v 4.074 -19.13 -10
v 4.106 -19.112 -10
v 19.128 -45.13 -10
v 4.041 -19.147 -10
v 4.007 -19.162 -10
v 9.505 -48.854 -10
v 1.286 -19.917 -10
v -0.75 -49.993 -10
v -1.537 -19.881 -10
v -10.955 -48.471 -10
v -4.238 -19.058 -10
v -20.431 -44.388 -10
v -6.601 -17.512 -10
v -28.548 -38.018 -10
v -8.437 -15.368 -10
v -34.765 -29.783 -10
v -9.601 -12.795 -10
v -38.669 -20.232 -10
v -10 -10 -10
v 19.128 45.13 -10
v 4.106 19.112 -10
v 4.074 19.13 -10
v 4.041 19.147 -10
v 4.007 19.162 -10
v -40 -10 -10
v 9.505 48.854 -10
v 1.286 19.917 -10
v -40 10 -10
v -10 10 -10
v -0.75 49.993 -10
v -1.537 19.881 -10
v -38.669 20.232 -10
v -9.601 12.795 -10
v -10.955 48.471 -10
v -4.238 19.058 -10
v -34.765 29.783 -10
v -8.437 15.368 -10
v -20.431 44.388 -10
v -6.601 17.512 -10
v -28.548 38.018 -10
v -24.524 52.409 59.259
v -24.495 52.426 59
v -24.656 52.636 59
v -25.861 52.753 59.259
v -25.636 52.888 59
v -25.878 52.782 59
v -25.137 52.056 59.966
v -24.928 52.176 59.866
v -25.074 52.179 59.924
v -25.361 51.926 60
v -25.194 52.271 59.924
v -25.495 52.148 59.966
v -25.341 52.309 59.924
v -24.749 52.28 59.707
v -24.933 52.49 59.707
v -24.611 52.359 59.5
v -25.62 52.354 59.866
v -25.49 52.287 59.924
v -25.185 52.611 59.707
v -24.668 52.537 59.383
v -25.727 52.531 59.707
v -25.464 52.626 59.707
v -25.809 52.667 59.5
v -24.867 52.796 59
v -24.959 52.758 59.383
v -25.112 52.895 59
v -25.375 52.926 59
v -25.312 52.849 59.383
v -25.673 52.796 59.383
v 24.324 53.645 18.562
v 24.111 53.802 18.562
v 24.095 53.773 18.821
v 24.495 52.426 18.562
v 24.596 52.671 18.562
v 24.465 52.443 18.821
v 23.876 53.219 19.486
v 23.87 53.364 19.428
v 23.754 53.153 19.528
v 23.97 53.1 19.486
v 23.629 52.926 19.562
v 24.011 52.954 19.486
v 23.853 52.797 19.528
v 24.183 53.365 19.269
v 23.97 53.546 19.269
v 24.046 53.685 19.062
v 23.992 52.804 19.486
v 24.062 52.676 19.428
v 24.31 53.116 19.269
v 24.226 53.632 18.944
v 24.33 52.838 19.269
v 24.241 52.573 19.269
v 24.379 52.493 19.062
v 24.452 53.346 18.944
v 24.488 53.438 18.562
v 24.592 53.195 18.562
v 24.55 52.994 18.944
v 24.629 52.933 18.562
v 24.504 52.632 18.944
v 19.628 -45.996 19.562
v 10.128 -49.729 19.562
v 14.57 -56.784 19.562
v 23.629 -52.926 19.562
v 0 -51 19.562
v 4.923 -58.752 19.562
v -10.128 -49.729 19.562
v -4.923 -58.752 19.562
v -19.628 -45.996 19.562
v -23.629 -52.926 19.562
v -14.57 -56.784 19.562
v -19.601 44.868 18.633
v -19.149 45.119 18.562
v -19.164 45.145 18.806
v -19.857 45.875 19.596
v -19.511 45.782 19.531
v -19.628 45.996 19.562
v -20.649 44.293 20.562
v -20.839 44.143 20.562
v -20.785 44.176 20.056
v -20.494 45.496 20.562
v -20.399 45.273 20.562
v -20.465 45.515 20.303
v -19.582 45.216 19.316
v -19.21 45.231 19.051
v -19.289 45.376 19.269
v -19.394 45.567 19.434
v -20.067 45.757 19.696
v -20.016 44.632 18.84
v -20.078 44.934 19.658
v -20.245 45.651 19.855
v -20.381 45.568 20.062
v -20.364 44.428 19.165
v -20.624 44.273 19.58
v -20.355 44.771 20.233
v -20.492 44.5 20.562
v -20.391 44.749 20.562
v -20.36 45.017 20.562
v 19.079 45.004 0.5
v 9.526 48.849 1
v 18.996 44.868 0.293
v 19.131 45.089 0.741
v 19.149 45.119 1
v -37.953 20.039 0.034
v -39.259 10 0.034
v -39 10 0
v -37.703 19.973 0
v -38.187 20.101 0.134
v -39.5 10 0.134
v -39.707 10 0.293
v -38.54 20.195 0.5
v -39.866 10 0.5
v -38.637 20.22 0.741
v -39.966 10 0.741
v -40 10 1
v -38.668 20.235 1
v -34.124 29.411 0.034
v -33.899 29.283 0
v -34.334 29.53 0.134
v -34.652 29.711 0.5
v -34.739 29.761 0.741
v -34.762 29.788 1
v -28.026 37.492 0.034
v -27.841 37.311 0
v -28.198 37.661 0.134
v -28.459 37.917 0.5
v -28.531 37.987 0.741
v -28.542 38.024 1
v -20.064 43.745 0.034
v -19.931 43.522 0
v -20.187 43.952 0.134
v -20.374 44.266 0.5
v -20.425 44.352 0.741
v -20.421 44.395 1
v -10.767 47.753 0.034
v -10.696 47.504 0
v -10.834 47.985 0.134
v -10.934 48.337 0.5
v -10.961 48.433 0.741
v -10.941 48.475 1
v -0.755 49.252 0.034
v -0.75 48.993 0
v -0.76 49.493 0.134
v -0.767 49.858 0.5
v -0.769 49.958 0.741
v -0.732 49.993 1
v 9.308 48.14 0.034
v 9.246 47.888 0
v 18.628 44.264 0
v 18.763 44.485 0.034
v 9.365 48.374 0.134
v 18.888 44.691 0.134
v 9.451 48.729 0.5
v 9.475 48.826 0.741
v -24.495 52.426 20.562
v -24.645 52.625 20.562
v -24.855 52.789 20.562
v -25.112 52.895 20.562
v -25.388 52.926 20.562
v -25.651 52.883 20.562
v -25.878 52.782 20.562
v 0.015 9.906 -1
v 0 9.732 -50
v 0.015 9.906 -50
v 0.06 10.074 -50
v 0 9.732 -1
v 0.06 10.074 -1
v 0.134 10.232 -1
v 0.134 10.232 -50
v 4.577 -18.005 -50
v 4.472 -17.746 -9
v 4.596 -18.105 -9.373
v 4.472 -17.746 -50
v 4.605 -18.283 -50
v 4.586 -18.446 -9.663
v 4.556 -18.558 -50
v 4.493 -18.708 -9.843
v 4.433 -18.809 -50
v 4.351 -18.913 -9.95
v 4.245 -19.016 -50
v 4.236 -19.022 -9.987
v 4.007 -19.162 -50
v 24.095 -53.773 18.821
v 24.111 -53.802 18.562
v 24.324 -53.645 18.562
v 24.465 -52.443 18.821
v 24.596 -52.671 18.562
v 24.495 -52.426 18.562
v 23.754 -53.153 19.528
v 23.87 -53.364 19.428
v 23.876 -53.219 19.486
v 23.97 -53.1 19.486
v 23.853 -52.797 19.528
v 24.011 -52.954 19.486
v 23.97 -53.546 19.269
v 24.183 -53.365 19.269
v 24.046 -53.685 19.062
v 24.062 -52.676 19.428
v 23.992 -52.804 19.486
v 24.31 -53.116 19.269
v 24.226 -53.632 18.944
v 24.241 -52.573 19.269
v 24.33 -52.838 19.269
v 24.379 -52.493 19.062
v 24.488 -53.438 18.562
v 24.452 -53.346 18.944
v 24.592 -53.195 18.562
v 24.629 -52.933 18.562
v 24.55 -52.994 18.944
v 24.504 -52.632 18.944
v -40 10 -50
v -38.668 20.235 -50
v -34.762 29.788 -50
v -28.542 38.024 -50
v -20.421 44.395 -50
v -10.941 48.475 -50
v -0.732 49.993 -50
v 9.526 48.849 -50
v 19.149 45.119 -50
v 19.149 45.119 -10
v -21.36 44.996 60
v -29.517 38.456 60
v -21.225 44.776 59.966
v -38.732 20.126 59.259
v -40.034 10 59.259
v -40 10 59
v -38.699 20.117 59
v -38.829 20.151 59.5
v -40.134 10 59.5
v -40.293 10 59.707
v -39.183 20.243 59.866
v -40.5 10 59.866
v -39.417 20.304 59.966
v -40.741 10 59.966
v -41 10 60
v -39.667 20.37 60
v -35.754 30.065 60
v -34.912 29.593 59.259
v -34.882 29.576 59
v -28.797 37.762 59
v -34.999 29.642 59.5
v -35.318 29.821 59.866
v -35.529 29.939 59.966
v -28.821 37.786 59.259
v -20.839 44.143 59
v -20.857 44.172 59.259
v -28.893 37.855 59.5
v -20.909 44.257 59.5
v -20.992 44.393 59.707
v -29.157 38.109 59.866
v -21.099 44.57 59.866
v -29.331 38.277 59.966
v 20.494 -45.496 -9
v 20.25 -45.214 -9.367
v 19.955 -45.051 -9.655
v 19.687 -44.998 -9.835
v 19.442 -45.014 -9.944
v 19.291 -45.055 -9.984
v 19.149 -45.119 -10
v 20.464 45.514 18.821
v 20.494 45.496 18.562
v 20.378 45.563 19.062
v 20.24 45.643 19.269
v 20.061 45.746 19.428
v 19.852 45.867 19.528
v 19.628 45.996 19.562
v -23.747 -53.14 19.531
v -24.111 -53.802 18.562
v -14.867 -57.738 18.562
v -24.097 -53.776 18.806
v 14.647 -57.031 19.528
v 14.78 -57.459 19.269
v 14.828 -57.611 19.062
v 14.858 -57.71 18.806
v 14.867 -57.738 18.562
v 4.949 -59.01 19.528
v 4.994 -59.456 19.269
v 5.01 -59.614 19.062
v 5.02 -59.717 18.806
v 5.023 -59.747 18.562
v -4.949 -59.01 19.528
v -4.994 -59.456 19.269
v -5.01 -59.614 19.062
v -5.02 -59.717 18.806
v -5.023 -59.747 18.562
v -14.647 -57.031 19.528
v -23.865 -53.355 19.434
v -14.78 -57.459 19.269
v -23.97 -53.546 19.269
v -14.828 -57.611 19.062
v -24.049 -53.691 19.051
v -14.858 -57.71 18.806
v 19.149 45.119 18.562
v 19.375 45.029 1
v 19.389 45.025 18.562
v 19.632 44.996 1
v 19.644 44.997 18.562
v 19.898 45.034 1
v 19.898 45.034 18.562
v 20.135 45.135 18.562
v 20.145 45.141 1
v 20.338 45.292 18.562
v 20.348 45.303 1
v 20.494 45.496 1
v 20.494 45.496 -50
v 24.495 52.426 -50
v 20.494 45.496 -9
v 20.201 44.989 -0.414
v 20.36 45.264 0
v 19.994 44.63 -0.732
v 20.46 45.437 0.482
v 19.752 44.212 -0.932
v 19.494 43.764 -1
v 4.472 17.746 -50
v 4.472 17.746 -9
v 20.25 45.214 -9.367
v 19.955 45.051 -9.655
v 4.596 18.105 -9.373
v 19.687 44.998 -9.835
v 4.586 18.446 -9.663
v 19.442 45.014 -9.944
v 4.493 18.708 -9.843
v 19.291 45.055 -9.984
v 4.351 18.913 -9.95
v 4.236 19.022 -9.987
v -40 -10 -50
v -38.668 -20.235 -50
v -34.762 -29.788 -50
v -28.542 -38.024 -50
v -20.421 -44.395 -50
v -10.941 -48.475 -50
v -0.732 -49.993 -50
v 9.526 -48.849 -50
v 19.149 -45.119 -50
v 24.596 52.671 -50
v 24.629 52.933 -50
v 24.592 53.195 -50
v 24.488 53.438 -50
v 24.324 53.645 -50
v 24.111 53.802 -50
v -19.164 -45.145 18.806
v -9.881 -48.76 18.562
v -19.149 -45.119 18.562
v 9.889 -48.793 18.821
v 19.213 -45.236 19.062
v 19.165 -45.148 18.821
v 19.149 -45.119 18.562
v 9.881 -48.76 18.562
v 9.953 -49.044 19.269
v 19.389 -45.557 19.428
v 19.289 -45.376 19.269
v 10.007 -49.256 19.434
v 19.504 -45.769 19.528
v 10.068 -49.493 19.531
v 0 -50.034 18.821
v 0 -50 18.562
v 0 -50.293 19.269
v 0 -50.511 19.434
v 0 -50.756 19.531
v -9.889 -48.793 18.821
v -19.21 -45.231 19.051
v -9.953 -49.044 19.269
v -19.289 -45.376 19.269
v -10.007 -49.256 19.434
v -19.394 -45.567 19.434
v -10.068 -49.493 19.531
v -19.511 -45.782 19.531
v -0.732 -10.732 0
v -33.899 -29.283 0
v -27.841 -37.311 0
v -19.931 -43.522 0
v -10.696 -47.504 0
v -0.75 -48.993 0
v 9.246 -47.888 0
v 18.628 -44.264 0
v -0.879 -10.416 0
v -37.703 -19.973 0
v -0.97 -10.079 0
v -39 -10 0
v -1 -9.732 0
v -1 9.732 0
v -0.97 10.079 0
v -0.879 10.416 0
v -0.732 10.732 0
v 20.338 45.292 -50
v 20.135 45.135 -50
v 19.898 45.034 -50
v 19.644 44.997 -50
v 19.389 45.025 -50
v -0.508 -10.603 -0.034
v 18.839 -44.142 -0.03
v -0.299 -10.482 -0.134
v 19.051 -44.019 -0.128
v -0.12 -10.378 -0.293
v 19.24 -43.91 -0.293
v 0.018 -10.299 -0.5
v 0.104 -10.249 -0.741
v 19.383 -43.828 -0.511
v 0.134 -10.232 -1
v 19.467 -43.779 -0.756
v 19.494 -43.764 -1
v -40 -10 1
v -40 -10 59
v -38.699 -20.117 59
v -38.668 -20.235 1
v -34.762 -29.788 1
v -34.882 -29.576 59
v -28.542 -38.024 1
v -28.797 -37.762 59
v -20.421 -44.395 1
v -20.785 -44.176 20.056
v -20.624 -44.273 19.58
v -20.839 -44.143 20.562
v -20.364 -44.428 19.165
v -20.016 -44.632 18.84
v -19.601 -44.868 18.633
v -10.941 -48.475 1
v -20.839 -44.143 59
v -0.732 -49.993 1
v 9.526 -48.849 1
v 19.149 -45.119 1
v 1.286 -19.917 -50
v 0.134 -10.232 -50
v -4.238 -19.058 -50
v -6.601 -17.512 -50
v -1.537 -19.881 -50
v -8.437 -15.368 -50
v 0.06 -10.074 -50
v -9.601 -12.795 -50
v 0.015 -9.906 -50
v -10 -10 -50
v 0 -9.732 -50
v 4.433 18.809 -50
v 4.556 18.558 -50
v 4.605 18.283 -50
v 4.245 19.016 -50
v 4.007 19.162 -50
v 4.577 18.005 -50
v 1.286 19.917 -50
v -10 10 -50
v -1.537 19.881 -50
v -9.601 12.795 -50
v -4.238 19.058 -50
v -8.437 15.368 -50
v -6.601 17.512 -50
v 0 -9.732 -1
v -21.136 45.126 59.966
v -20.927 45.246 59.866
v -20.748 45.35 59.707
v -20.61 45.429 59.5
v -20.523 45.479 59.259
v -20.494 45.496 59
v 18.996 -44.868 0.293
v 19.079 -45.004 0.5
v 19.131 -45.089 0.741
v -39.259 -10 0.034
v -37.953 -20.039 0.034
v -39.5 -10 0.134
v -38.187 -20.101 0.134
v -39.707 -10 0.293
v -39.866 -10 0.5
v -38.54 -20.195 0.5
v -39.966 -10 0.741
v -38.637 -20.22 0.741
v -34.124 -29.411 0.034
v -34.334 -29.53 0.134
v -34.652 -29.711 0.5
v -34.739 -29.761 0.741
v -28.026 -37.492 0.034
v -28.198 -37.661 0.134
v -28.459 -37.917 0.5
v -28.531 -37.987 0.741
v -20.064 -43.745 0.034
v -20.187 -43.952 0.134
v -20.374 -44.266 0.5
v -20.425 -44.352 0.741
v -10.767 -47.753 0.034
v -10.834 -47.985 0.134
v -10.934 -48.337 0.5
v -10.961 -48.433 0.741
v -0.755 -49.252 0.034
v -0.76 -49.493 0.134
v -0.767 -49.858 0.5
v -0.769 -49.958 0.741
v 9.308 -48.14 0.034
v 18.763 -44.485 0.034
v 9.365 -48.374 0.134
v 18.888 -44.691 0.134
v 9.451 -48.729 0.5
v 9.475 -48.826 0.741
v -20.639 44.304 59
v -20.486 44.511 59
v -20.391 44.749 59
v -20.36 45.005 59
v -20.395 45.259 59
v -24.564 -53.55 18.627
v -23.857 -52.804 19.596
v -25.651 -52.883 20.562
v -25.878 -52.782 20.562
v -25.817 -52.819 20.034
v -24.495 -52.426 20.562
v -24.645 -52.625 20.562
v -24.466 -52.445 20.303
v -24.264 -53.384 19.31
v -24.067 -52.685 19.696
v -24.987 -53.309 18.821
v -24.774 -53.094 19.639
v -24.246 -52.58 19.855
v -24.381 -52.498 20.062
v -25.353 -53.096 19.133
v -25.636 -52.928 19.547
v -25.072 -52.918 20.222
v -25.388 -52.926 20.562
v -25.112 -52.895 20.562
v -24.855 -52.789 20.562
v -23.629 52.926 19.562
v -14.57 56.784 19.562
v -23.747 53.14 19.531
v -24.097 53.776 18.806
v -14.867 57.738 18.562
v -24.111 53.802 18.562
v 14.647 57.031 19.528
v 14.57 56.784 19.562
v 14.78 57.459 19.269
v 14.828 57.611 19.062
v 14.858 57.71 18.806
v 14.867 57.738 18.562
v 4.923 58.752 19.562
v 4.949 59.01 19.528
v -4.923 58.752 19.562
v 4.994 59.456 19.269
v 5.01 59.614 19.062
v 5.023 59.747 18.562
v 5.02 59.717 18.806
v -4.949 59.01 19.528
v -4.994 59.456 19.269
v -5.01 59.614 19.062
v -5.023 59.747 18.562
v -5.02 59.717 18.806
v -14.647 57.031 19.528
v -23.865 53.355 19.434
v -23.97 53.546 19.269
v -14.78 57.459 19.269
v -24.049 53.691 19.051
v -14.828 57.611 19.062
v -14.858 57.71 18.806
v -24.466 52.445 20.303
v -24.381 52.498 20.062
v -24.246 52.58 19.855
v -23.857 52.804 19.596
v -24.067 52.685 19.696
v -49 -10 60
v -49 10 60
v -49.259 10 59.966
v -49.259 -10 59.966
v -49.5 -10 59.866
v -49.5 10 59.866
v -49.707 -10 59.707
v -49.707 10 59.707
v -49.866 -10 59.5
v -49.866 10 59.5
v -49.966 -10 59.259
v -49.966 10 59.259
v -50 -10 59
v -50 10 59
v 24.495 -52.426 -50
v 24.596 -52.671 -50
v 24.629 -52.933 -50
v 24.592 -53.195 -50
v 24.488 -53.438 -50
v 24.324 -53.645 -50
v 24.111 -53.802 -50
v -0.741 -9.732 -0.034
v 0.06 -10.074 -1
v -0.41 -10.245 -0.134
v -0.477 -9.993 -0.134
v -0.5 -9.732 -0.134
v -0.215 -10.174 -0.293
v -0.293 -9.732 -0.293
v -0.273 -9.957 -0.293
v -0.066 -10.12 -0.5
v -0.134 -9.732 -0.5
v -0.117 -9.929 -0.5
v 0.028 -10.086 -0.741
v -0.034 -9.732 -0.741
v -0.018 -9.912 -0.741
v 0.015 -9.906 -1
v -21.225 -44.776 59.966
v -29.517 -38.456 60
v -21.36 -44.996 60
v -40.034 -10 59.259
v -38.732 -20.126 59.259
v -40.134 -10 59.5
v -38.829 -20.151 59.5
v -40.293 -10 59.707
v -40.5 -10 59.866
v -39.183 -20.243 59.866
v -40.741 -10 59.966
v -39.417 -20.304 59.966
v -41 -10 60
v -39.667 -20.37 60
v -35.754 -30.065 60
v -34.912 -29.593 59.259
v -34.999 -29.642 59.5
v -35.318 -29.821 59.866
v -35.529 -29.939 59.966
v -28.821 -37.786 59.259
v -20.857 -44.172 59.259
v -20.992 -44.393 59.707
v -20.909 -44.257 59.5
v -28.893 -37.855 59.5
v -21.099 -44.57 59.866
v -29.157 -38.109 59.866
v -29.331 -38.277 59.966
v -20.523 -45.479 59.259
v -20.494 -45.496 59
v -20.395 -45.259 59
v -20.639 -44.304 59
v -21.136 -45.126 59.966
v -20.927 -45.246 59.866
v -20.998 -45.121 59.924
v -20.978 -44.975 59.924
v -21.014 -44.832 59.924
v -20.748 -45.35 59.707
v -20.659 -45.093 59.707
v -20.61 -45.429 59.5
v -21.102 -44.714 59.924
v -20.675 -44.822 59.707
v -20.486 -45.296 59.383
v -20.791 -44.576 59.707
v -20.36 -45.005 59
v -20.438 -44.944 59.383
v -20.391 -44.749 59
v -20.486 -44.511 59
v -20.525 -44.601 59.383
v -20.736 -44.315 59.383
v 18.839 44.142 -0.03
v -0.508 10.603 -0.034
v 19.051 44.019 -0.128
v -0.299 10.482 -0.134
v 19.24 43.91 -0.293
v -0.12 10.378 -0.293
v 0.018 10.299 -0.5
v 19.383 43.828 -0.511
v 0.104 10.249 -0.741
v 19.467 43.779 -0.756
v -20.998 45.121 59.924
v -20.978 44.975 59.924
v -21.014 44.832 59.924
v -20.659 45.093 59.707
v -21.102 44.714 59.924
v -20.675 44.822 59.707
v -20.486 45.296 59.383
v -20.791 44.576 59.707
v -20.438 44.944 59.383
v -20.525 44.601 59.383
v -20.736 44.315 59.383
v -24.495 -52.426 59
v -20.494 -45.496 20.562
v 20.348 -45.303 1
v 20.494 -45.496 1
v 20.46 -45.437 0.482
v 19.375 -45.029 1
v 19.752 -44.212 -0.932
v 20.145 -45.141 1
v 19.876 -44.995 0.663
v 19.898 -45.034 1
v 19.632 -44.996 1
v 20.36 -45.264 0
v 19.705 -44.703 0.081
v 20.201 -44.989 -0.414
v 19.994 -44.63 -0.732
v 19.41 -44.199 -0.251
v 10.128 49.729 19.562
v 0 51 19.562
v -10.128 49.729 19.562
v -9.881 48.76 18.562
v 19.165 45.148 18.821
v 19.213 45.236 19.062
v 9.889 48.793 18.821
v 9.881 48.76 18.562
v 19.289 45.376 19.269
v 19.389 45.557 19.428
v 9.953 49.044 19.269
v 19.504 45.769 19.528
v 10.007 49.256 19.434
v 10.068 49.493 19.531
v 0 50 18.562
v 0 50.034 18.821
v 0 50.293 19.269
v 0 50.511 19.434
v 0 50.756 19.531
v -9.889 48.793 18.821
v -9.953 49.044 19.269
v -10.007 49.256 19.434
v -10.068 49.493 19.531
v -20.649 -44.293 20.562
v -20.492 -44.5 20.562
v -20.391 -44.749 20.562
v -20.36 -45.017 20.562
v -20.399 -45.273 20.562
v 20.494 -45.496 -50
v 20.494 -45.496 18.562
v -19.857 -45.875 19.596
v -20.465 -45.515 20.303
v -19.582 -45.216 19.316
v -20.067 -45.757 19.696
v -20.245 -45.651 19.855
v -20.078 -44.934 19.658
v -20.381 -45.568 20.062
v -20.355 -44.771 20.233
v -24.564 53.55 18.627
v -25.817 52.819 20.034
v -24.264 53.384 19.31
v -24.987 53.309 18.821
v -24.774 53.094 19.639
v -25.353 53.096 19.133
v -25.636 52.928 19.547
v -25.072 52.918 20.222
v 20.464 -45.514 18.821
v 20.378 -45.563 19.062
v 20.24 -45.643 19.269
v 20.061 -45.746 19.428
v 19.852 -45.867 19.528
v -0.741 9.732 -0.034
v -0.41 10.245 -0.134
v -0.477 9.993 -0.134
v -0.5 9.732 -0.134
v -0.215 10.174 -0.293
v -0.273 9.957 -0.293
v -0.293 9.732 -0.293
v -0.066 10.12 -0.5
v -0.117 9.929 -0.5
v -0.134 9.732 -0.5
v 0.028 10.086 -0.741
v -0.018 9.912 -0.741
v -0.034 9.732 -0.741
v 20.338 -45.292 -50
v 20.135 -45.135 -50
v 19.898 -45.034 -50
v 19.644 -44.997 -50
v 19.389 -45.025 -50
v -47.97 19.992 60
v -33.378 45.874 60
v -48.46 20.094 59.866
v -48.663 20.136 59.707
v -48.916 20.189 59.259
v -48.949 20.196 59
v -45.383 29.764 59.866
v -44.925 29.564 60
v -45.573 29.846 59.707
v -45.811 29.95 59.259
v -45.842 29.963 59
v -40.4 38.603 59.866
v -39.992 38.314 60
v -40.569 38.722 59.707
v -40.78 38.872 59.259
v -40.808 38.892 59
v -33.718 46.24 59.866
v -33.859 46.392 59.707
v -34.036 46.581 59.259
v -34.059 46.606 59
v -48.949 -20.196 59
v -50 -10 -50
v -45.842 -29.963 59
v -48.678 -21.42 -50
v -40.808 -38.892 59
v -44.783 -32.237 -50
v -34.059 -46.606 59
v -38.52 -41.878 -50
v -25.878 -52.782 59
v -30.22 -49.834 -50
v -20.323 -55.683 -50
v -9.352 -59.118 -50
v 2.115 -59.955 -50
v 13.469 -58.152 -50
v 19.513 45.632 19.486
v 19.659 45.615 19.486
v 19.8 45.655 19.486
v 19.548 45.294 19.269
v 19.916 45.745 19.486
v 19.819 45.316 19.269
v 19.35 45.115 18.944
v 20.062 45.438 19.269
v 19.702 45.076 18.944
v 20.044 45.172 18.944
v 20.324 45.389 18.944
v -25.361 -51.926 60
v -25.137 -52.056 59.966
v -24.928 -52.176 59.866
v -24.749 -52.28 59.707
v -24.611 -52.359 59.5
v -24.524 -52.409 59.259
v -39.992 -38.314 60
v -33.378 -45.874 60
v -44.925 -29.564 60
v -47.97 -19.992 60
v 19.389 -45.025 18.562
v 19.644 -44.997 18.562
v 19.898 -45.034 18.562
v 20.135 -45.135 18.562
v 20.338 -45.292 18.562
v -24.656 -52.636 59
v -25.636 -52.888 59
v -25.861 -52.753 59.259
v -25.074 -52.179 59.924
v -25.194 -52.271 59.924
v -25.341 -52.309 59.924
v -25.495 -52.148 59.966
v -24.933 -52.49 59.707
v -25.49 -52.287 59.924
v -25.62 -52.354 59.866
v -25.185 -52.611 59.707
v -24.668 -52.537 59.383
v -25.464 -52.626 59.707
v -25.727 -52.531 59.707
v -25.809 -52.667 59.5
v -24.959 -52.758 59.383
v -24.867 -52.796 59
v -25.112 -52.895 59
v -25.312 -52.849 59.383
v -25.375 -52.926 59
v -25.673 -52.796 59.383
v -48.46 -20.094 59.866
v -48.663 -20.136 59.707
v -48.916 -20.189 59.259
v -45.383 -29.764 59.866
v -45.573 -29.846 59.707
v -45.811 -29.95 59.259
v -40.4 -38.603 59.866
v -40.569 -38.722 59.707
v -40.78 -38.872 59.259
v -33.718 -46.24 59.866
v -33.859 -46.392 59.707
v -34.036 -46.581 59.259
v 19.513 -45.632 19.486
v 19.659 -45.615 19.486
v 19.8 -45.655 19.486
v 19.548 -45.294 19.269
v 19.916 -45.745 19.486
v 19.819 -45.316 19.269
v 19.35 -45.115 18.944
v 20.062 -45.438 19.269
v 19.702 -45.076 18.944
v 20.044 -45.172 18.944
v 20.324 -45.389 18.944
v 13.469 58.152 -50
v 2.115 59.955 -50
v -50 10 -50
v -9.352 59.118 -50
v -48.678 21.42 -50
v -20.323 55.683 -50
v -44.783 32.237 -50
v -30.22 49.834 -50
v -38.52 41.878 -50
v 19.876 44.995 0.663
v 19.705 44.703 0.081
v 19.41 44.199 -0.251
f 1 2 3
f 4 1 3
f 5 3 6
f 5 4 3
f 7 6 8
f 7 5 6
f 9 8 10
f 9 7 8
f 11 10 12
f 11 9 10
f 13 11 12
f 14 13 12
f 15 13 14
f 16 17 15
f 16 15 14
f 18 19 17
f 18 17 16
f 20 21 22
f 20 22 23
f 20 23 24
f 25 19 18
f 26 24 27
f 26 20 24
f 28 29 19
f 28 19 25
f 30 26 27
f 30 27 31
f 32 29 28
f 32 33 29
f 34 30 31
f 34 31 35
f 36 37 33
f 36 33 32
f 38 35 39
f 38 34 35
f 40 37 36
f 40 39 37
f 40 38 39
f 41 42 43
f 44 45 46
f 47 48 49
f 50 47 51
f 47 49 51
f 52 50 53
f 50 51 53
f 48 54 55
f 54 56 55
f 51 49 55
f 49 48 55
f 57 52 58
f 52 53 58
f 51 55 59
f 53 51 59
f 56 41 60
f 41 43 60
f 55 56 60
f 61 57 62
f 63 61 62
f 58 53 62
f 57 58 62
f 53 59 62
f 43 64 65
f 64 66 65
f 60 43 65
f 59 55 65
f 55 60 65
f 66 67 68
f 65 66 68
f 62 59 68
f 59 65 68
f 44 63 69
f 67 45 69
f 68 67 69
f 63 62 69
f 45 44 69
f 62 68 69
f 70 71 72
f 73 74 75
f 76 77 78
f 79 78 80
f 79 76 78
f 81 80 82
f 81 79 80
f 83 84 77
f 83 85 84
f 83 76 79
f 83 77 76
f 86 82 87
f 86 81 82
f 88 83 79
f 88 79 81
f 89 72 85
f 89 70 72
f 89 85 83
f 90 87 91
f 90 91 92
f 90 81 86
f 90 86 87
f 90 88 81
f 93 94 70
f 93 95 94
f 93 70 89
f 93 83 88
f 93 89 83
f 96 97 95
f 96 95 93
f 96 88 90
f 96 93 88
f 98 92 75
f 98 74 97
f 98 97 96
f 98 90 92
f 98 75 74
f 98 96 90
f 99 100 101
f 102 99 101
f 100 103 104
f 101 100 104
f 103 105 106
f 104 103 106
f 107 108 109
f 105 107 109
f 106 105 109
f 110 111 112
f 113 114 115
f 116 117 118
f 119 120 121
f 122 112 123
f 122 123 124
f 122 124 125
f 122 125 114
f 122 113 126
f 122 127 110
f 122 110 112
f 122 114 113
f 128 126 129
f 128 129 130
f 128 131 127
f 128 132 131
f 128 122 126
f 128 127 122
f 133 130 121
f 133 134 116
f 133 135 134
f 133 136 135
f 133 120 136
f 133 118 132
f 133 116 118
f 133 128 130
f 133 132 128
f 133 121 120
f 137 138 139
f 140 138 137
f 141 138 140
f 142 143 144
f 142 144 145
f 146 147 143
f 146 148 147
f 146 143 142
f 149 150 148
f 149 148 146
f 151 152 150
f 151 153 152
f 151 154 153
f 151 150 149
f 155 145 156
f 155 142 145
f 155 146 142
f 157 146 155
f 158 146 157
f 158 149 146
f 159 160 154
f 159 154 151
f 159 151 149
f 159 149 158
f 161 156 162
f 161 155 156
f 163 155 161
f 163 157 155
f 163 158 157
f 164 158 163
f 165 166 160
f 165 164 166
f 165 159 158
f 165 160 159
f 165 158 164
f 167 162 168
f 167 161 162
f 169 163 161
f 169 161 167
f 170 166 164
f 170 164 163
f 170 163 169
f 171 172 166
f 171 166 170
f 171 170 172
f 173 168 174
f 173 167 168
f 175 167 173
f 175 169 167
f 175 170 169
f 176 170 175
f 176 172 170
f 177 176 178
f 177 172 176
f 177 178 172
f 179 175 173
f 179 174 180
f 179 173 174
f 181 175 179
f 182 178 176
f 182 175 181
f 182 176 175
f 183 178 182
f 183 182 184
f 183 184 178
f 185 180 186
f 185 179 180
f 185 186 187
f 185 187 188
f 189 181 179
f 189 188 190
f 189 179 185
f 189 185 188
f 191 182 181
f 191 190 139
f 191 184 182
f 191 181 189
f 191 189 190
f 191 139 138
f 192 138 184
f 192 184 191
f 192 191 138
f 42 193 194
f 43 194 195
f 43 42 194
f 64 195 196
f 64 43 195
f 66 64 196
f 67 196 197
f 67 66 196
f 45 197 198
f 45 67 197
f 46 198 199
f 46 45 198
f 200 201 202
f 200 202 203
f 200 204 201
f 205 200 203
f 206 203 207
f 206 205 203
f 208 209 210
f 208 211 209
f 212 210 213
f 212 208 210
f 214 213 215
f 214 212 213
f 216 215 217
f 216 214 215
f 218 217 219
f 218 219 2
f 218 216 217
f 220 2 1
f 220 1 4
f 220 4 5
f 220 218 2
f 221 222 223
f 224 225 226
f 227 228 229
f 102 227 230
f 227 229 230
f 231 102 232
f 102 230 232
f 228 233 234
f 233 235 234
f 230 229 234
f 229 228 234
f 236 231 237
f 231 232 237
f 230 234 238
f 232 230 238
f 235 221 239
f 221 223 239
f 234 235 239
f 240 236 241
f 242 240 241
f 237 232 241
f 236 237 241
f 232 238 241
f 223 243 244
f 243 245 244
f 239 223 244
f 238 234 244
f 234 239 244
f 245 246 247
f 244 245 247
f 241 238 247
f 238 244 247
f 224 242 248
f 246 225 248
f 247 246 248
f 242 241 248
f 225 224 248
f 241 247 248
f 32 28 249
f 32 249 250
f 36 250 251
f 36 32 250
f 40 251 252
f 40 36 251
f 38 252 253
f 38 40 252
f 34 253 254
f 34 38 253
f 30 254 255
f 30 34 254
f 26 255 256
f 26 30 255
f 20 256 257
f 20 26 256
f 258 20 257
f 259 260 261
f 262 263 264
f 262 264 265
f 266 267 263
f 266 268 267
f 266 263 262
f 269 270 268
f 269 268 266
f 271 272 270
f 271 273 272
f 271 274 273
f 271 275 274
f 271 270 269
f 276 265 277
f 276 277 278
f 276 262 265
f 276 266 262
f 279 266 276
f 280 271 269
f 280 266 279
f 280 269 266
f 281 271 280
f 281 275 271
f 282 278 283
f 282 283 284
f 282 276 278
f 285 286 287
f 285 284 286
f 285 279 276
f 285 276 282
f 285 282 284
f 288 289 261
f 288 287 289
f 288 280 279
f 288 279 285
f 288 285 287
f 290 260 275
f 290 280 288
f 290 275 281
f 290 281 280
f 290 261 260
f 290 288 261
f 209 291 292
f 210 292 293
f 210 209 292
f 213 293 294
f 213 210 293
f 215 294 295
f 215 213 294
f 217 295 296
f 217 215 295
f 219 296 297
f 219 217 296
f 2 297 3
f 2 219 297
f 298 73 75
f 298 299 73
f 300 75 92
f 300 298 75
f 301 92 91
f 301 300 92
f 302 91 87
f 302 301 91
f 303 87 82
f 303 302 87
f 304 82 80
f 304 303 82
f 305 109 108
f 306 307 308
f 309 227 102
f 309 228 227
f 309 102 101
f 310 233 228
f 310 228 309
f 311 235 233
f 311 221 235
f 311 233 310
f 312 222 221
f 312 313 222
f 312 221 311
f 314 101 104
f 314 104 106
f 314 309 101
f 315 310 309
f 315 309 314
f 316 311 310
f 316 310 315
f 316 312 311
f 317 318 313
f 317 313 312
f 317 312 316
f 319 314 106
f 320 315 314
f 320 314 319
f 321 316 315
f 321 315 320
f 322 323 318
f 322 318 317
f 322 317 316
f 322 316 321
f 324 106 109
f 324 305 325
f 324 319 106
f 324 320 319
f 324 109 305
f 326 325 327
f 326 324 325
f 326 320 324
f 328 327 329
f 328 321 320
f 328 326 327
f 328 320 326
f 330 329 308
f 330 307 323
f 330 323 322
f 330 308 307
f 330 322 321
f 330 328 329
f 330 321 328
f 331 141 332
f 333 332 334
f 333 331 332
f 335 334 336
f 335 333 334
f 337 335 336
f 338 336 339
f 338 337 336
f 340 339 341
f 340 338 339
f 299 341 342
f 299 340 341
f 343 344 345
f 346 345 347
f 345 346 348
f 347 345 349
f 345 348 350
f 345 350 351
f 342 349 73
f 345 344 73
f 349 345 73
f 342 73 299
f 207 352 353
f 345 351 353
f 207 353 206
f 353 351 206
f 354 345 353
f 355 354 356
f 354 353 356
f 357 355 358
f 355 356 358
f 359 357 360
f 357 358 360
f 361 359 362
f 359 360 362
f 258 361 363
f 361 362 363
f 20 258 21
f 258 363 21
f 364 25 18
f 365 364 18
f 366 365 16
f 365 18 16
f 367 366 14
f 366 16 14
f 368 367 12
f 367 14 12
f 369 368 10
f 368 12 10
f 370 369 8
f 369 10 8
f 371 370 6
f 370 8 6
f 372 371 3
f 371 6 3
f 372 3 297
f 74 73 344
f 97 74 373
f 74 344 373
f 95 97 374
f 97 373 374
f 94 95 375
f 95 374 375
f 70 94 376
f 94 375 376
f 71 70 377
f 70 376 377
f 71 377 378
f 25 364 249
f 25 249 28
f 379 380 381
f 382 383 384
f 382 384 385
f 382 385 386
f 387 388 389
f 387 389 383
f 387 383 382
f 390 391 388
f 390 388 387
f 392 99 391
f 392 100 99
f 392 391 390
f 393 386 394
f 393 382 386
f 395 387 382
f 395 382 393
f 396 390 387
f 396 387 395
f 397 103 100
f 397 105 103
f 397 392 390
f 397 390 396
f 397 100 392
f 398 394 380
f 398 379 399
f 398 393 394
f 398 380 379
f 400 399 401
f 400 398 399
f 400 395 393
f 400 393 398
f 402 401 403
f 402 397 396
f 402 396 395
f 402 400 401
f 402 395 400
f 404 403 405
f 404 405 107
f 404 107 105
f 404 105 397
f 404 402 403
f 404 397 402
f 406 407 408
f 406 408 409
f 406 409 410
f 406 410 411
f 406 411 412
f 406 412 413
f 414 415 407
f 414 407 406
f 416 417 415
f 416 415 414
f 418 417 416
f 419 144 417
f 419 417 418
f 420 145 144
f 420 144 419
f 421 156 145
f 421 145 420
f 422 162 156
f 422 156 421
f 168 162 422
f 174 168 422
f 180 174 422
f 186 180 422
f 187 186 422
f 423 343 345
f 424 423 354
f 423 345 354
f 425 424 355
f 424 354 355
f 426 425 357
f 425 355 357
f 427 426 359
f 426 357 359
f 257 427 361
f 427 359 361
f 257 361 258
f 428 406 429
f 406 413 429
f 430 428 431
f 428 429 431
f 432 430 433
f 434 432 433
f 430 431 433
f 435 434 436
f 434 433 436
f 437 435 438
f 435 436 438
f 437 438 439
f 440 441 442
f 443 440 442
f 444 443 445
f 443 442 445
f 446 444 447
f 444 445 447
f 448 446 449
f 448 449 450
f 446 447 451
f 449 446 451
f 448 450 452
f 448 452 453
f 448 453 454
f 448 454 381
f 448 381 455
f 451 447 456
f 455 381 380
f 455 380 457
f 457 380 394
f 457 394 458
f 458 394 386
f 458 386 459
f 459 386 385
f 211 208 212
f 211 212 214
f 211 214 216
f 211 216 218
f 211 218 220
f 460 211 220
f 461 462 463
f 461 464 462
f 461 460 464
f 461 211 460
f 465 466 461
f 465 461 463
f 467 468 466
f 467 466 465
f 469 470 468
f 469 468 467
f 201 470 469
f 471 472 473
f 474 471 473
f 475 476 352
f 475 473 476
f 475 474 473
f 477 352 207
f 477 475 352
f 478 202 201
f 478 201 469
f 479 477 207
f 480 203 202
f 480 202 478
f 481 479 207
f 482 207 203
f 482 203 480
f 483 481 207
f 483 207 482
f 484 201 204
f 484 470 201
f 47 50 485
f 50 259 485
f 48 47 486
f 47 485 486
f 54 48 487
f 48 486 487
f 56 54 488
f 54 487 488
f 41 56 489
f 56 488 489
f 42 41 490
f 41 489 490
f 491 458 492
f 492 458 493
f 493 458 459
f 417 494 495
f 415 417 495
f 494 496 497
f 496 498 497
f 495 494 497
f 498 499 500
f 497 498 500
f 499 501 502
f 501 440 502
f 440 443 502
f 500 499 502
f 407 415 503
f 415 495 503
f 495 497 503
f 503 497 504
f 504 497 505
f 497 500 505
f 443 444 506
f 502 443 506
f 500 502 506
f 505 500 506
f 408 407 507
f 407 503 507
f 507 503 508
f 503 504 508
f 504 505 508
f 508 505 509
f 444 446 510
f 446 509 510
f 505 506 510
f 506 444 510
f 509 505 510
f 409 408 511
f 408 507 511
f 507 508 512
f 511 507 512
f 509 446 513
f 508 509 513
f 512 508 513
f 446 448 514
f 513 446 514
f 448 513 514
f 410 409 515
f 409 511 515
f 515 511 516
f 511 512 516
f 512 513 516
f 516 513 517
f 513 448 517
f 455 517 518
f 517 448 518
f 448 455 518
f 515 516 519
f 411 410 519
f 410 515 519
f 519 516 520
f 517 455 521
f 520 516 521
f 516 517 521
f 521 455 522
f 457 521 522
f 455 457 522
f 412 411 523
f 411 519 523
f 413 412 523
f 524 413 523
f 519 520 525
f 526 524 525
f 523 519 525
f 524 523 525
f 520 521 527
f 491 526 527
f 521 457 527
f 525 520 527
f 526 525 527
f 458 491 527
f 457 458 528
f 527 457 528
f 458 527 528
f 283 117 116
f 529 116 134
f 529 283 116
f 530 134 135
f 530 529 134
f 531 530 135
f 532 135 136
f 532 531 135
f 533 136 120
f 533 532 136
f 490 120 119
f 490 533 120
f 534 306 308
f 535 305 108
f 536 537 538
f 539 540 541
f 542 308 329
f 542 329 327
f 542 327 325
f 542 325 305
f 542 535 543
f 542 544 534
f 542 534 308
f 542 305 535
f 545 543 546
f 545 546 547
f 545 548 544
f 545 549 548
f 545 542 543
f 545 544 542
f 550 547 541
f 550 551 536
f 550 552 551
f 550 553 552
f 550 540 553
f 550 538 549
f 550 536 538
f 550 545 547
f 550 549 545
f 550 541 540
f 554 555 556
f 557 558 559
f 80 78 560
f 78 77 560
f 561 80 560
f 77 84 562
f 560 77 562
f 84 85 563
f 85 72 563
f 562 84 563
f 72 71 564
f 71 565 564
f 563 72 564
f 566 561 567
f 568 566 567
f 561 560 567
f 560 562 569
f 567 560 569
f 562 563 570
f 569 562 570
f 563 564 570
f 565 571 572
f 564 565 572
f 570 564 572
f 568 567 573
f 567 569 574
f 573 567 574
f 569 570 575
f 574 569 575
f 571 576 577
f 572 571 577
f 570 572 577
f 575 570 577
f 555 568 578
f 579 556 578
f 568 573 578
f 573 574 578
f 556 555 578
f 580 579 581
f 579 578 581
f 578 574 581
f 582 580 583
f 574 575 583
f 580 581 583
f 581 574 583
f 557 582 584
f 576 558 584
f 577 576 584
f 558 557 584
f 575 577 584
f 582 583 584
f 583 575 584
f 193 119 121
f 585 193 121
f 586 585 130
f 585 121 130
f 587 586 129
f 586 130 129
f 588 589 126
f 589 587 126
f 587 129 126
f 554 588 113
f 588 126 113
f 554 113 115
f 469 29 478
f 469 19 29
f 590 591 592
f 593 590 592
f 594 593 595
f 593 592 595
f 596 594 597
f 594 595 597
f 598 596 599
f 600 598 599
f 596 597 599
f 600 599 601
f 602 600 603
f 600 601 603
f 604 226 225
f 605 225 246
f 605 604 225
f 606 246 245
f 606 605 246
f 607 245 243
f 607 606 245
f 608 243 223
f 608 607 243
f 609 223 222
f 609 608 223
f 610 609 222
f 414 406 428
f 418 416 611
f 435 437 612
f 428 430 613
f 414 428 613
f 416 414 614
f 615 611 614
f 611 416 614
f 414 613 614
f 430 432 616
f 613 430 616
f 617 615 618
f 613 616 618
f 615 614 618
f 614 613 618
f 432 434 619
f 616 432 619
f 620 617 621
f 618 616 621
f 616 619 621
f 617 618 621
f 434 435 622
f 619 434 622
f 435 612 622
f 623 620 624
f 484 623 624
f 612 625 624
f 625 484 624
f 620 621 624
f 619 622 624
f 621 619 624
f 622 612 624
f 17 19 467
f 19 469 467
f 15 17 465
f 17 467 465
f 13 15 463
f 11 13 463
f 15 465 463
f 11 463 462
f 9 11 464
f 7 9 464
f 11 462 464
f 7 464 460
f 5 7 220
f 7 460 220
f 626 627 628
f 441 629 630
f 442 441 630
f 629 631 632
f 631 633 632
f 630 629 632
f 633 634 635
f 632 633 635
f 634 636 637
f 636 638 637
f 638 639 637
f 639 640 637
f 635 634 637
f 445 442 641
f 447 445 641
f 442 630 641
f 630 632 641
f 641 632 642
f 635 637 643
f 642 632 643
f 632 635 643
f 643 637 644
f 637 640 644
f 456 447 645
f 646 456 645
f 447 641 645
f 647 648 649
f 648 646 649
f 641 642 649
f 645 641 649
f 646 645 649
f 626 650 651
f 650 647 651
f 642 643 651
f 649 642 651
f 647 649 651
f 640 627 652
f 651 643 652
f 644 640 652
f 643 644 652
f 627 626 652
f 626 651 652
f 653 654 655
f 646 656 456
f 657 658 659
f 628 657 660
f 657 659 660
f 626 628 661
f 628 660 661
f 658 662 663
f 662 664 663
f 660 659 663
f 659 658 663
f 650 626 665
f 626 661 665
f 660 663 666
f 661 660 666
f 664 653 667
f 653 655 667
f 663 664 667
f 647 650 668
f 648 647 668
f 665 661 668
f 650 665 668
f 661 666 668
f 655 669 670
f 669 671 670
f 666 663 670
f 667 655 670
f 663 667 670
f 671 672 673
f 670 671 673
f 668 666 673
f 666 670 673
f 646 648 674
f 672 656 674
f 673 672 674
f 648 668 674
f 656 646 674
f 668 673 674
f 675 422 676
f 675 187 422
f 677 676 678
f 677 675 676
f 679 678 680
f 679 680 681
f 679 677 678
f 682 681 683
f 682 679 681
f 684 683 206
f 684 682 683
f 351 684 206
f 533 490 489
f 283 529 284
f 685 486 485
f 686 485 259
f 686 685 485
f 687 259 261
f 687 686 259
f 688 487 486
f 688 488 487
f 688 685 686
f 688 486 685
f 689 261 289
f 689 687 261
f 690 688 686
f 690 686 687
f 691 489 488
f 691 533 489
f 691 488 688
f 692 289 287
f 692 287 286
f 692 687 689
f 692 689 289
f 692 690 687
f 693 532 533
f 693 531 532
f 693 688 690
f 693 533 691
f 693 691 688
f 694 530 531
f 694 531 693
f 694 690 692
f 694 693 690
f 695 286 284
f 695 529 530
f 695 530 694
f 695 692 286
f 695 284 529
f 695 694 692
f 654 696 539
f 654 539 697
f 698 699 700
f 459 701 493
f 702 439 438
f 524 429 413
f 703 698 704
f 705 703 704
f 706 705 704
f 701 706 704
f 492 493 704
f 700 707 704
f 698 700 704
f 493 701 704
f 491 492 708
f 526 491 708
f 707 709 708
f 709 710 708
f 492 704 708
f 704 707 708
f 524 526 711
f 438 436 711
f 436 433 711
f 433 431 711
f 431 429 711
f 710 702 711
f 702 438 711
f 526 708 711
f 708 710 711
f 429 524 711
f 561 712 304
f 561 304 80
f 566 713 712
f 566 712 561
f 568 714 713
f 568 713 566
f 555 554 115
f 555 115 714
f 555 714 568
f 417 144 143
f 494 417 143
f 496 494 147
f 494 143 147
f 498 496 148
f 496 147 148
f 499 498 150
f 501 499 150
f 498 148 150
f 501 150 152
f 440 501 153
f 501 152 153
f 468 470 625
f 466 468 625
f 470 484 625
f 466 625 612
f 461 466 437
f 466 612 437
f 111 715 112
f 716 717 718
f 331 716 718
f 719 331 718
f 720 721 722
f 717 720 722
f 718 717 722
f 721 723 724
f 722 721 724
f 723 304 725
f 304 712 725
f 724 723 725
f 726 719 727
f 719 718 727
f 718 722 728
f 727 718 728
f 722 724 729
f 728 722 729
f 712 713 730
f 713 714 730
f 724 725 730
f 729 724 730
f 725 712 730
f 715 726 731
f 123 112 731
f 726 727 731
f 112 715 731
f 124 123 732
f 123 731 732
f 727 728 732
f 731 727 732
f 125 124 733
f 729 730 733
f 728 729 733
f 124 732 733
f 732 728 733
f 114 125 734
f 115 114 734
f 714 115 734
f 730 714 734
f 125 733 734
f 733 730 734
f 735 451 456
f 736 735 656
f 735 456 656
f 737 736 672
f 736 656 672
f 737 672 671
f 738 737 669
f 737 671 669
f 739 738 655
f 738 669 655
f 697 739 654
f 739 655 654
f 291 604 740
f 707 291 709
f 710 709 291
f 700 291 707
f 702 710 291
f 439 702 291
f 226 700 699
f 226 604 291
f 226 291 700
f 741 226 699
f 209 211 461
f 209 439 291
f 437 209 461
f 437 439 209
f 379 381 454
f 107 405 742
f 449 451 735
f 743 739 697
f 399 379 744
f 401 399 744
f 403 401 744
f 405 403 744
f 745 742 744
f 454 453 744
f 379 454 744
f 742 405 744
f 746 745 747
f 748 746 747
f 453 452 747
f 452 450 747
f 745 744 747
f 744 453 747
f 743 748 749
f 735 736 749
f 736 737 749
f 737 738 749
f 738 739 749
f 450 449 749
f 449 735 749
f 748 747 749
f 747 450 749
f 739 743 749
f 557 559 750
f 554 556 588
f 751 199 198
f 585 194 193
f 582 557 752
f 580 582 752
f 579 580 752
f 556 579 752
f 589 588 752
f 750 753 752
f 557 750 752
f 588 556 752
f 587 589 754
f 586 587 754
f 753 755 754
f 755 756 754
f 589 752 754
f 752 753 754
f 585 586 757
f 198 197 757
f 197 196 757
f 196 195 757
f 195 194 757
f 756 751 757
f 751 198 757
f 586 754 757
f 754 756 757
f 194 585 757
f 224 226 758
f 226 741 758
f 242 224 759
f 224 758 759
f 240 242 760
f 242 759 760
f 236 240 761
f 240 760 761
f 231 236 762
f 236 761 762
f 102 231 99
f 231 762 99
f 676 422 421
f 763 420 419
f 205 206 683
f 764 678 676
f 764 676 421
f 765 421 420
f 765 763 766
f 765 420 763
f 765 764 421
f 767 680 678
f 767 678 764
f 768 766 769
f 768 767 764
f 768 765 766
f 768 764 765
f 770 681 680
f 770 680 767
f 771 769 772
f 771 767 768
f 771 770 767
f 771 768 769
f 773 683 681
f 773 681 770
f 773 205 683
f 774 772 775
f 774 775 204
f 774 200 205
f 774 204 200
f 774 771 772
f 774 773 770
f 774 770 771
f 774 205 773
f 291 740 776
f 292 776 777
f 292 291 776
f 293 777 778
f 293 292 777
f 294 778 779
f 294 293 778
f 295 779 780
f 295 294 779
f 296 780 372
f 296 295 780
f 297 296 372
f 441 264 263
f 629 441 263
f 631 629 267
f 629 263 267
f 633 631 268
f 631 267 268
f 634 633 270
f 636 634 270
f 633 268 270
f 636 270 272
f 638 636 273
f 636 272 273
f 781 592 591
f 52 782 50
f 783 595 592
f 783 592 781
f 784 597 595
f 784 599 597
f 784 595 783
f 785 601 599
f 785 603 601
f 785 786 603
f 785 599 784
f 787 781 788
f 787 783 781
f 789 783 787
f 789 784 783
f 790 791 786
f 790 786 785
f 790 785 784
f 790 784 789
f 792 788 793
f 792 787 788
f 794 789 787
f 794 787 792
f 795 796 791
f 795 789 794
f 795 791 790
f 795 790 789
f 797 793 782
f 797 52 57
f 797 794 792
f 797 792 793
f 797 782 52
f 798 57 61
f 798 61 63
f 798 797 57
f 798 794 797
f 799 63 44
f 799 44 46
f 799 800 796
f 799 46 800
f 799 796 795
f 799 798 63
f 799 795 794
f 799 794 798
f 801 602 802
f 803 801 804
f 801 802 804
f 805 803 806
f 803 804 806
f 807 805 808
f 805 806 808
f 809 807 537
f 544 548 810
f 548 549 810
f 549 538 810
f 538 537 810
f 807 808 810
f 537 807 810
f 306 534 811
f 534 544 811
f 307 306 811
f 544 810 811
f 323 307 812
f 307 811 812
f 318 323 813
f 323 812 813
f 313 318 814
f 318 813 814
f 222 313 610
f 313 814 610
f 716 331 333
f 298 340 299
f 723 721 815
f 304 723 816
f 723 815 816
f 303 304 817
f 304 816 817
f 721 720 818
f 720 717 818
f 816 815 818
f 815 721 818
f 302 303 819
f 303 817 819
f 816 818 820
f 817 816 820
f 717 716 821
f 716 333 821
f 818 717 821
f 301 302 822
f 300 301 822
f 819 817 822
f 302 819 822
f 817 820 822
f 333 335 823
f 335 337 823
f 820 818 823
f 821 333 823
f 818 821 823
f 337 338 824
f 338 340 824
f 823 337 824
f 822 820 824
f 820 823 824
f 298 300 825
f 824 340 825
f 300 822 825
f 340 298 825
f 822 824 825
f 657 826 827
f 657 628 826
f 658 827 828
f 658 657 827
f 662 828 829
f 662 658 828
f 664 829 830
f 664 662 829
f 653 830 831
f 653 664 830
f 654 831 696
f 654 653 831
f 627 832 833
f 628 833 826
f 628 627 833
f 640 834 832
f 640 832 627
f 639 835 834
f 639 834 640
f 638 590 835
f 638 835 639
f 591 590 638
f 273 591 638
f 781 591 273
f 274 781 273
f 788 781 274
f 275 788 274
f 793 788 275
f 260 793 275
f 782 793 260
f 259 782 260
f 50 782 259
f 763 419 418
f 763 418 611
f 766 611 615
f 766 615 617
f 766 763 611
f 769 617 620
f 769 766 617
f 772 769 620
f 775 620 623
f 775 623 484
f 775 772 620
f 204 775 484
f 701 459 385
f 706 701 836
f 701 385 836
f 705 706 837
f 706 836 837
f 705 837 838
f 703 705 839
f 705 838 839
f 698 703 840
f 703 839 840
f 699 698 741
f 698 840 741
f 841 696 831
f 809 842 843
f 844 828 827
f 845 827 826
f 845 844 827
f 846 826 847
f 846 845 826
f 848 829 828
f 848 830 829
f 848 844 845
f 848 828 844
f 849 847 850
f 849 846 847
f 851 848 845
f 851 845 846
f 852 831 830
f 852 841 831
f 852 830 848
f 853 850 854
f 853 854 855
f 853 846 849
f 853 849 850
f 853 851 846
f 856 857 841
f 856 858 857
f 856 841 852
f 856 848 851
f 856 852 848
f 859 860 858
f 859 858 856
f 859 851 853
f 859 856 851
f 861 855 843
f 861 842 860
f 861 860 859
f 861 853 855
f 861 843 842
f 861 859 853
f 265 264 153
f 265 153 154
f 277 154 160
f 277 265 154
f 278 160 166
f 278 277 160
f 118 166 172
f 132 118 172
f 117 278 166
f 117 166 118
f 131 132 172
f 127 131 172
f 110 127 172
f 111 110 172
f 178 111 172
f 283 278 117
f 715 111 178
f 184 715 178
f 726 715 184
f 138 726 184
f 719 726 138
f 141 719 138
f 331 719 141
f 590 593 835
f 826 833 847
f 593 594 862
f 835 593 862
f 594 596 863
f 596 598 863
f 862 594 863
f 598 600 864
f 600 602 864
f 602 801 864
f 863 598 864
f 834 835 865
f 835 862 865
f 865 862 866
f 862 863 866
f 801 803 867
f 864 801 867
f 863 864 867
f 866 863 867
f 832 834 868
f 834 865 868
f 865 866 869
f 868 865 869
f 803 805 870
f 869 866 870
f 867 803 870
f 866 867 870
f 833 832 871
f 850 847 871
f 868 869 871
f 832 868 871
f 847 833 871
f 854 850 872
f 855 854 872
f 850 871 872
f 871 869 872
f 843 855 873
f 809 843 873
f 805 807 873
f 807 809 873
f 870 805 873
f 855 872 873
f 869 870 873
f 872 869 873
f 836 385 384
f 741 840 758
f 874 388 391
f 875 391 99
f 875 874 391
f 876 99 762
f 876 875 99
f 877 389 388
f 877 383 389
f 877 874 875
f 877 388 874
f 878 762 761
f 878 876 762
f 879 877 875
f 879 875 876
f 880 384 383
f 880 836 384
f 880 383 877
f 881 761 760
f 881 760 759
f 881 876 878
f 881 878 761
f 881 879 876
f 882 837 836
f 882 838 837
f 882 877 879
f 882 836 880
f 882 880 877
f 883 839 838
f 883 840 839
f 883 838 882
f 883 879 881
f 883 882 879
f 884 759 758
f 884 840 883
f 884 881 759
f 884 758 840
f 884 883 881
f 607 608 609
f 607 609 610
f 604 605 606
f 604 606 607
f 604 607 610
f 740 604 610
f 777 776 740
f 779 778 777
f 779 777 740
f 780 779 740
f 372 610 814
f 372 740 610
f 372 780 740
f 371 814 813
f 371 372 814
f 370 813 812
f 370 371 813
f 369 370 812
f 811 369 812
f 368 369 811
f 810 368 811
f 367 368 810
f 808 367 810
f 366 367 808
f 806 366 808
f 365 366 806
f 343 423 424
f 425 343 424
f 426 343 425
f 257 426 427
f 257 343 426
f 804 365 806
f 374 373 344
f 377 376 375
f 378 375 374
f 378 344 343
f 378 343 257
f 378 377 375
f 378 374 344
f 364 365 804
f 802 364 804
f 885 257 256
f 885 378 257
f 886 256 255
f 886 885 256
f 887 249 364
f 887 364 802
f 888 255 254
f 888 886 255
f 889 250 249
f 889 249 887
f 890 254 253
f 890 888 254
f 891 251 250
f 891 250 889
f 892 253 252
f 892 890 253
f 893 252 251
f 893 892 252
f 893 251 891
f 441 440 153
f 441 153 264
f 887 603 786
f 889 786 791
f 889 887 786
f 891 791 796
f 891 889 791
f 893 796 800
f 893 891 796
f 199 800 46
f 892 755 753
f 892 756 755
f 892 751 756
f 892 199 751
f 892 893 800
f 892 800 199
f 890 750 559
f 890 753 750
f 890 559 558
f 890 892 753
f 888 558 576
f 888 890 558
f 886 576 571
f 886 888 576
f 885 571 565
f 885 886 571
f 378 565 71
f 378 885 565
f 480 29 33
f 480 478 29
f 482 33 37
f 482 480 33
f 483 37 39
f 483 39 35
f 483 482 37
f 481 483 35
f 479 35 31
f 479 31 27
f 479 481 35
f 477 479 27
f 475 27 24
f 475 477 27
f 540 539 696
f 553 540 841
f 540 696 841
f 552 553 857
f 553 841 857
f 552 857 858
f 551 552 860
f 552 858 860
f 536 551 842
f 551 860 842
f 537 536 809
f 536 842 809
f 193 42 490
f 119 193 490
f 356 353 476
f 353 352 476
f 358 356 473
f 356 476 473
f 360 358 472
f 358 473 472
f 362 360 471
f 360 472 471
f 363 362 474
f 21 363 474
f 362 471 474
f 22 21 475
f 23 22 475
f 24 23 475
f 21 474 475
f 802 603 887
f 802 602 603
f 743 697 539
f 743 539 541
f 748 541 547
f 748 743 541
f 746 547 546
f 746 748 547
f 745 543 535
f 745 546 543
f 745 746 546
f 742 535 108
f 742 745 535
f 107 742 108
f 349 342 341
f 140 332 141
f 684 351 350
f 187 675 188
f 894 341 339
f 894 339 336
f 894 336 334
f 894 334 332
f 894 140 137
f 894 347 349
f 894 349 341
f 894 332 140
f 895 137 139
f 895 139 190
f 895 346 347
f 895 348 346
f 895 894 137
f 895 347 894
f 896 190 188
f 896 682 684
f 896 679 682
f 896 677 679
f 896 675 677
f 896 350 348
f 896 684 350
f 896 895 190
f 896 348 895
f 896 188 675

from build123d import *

# Parameters (mm, degrees)
F1_DEPTH = 10
F2_ANGLE = 120
F3_W     = 10
F3_H     = 40.4382864386
F4_ANGLE = 60
F5_R     = 1


with BuildPart() as f1:
    # F0 (on Front) → F1 (new body)
    with BuildSketch(Plane.XZ):
        Polygon((0, -50), (0, 0), (-40, 0), (-40, 60), (-50, 60), (-50, -50), (-40, -50), (-40, -10), (-10, -10), (-10, -50), align=None)
    extrude(amount=F1_DEPTH)

    # F1_face (on face) → F2 (revolve)
    with BuildSketch(Plane(origin=(-31.3157894737, -10, -4.4736842105), x_dir=(1, 0, 0), z_dir=(0, -1, 0))):
        Polygon((31.3157894737, -45.5263157895), (31.3157894737, 4.4736842105), (-8.6842105263, 4.4736842105), (-8.6842105263, 64.4736842105), (-18.6842105263, 64.4736842105), (-18.6842105263, -45.5263157895), (-8.6842105263, -45.5263157895), (-8.6842105263, -5.5263157895), (21.3157894737, -5.5263157895), (21.3157894737, -45.5263157895), align=None)
    revolve(axis=Axis((0, -10, -25), (0, 0, 1)), revolution_arc=F2_ANGLE)

    # F3 (on face) → F4 (revolve, cut)
    with BuildSketch(Plane(origin=(-4.3301270189, -2.5, 0), x_dir=(-0.5, 0.8660254038, 0), z_dir=(0.8660254038, 0.5, 0))):
        with Locations((-53.6602540378, 39.7808567807)):
            Rectangle(F3_W, F3_H)
    revolve(axis=Axis((0, -10, -25), (0, 0, -1)), revolution_arc=F4_ANGLE, mode=Mode.SUBTRACT)

    # F5
    f5_edges = [f1.edges().sort_by_distance(p)[0] for p in [
        (-34.641016, -30, 60),
        (-40, -5, 60),
        (-50, -5, 60),
        (-43.30127, -35, 60),
        (-25, -53.30127, 39.780857),
        (-20, -44.641016, 39.780857),
        (-22.5, -48.971143, 60),
        (-22.5, -48.971143, 19.561714),
        (0, -50, 19.561714),
        (0, -60, 19.561714),
        (22.5, -48.971143, 19.561714),
        (10, -27.320508, 0),
        (-20, -44.641016, 0),
        (-40, -10, 30),
        (-40, -5, 0),
        (0, -5, 0),
        (25, -53.30127, -15.219143),
        (20, -44.641016, 9.780857),
        (20, -44.641016, -30),
        (12.5, -31.650635, -10),
        (5, -18.660254, -30),
        (0, -10, -25),
    ]]
    fillet(f5_edges, radius=F5_R)

    # F6: F1 across plane


with BuildPart() as f1_1:
    add(f1.part)
    add(f1.part.mirror(Plane.XZ))


solid = f1_1.part
